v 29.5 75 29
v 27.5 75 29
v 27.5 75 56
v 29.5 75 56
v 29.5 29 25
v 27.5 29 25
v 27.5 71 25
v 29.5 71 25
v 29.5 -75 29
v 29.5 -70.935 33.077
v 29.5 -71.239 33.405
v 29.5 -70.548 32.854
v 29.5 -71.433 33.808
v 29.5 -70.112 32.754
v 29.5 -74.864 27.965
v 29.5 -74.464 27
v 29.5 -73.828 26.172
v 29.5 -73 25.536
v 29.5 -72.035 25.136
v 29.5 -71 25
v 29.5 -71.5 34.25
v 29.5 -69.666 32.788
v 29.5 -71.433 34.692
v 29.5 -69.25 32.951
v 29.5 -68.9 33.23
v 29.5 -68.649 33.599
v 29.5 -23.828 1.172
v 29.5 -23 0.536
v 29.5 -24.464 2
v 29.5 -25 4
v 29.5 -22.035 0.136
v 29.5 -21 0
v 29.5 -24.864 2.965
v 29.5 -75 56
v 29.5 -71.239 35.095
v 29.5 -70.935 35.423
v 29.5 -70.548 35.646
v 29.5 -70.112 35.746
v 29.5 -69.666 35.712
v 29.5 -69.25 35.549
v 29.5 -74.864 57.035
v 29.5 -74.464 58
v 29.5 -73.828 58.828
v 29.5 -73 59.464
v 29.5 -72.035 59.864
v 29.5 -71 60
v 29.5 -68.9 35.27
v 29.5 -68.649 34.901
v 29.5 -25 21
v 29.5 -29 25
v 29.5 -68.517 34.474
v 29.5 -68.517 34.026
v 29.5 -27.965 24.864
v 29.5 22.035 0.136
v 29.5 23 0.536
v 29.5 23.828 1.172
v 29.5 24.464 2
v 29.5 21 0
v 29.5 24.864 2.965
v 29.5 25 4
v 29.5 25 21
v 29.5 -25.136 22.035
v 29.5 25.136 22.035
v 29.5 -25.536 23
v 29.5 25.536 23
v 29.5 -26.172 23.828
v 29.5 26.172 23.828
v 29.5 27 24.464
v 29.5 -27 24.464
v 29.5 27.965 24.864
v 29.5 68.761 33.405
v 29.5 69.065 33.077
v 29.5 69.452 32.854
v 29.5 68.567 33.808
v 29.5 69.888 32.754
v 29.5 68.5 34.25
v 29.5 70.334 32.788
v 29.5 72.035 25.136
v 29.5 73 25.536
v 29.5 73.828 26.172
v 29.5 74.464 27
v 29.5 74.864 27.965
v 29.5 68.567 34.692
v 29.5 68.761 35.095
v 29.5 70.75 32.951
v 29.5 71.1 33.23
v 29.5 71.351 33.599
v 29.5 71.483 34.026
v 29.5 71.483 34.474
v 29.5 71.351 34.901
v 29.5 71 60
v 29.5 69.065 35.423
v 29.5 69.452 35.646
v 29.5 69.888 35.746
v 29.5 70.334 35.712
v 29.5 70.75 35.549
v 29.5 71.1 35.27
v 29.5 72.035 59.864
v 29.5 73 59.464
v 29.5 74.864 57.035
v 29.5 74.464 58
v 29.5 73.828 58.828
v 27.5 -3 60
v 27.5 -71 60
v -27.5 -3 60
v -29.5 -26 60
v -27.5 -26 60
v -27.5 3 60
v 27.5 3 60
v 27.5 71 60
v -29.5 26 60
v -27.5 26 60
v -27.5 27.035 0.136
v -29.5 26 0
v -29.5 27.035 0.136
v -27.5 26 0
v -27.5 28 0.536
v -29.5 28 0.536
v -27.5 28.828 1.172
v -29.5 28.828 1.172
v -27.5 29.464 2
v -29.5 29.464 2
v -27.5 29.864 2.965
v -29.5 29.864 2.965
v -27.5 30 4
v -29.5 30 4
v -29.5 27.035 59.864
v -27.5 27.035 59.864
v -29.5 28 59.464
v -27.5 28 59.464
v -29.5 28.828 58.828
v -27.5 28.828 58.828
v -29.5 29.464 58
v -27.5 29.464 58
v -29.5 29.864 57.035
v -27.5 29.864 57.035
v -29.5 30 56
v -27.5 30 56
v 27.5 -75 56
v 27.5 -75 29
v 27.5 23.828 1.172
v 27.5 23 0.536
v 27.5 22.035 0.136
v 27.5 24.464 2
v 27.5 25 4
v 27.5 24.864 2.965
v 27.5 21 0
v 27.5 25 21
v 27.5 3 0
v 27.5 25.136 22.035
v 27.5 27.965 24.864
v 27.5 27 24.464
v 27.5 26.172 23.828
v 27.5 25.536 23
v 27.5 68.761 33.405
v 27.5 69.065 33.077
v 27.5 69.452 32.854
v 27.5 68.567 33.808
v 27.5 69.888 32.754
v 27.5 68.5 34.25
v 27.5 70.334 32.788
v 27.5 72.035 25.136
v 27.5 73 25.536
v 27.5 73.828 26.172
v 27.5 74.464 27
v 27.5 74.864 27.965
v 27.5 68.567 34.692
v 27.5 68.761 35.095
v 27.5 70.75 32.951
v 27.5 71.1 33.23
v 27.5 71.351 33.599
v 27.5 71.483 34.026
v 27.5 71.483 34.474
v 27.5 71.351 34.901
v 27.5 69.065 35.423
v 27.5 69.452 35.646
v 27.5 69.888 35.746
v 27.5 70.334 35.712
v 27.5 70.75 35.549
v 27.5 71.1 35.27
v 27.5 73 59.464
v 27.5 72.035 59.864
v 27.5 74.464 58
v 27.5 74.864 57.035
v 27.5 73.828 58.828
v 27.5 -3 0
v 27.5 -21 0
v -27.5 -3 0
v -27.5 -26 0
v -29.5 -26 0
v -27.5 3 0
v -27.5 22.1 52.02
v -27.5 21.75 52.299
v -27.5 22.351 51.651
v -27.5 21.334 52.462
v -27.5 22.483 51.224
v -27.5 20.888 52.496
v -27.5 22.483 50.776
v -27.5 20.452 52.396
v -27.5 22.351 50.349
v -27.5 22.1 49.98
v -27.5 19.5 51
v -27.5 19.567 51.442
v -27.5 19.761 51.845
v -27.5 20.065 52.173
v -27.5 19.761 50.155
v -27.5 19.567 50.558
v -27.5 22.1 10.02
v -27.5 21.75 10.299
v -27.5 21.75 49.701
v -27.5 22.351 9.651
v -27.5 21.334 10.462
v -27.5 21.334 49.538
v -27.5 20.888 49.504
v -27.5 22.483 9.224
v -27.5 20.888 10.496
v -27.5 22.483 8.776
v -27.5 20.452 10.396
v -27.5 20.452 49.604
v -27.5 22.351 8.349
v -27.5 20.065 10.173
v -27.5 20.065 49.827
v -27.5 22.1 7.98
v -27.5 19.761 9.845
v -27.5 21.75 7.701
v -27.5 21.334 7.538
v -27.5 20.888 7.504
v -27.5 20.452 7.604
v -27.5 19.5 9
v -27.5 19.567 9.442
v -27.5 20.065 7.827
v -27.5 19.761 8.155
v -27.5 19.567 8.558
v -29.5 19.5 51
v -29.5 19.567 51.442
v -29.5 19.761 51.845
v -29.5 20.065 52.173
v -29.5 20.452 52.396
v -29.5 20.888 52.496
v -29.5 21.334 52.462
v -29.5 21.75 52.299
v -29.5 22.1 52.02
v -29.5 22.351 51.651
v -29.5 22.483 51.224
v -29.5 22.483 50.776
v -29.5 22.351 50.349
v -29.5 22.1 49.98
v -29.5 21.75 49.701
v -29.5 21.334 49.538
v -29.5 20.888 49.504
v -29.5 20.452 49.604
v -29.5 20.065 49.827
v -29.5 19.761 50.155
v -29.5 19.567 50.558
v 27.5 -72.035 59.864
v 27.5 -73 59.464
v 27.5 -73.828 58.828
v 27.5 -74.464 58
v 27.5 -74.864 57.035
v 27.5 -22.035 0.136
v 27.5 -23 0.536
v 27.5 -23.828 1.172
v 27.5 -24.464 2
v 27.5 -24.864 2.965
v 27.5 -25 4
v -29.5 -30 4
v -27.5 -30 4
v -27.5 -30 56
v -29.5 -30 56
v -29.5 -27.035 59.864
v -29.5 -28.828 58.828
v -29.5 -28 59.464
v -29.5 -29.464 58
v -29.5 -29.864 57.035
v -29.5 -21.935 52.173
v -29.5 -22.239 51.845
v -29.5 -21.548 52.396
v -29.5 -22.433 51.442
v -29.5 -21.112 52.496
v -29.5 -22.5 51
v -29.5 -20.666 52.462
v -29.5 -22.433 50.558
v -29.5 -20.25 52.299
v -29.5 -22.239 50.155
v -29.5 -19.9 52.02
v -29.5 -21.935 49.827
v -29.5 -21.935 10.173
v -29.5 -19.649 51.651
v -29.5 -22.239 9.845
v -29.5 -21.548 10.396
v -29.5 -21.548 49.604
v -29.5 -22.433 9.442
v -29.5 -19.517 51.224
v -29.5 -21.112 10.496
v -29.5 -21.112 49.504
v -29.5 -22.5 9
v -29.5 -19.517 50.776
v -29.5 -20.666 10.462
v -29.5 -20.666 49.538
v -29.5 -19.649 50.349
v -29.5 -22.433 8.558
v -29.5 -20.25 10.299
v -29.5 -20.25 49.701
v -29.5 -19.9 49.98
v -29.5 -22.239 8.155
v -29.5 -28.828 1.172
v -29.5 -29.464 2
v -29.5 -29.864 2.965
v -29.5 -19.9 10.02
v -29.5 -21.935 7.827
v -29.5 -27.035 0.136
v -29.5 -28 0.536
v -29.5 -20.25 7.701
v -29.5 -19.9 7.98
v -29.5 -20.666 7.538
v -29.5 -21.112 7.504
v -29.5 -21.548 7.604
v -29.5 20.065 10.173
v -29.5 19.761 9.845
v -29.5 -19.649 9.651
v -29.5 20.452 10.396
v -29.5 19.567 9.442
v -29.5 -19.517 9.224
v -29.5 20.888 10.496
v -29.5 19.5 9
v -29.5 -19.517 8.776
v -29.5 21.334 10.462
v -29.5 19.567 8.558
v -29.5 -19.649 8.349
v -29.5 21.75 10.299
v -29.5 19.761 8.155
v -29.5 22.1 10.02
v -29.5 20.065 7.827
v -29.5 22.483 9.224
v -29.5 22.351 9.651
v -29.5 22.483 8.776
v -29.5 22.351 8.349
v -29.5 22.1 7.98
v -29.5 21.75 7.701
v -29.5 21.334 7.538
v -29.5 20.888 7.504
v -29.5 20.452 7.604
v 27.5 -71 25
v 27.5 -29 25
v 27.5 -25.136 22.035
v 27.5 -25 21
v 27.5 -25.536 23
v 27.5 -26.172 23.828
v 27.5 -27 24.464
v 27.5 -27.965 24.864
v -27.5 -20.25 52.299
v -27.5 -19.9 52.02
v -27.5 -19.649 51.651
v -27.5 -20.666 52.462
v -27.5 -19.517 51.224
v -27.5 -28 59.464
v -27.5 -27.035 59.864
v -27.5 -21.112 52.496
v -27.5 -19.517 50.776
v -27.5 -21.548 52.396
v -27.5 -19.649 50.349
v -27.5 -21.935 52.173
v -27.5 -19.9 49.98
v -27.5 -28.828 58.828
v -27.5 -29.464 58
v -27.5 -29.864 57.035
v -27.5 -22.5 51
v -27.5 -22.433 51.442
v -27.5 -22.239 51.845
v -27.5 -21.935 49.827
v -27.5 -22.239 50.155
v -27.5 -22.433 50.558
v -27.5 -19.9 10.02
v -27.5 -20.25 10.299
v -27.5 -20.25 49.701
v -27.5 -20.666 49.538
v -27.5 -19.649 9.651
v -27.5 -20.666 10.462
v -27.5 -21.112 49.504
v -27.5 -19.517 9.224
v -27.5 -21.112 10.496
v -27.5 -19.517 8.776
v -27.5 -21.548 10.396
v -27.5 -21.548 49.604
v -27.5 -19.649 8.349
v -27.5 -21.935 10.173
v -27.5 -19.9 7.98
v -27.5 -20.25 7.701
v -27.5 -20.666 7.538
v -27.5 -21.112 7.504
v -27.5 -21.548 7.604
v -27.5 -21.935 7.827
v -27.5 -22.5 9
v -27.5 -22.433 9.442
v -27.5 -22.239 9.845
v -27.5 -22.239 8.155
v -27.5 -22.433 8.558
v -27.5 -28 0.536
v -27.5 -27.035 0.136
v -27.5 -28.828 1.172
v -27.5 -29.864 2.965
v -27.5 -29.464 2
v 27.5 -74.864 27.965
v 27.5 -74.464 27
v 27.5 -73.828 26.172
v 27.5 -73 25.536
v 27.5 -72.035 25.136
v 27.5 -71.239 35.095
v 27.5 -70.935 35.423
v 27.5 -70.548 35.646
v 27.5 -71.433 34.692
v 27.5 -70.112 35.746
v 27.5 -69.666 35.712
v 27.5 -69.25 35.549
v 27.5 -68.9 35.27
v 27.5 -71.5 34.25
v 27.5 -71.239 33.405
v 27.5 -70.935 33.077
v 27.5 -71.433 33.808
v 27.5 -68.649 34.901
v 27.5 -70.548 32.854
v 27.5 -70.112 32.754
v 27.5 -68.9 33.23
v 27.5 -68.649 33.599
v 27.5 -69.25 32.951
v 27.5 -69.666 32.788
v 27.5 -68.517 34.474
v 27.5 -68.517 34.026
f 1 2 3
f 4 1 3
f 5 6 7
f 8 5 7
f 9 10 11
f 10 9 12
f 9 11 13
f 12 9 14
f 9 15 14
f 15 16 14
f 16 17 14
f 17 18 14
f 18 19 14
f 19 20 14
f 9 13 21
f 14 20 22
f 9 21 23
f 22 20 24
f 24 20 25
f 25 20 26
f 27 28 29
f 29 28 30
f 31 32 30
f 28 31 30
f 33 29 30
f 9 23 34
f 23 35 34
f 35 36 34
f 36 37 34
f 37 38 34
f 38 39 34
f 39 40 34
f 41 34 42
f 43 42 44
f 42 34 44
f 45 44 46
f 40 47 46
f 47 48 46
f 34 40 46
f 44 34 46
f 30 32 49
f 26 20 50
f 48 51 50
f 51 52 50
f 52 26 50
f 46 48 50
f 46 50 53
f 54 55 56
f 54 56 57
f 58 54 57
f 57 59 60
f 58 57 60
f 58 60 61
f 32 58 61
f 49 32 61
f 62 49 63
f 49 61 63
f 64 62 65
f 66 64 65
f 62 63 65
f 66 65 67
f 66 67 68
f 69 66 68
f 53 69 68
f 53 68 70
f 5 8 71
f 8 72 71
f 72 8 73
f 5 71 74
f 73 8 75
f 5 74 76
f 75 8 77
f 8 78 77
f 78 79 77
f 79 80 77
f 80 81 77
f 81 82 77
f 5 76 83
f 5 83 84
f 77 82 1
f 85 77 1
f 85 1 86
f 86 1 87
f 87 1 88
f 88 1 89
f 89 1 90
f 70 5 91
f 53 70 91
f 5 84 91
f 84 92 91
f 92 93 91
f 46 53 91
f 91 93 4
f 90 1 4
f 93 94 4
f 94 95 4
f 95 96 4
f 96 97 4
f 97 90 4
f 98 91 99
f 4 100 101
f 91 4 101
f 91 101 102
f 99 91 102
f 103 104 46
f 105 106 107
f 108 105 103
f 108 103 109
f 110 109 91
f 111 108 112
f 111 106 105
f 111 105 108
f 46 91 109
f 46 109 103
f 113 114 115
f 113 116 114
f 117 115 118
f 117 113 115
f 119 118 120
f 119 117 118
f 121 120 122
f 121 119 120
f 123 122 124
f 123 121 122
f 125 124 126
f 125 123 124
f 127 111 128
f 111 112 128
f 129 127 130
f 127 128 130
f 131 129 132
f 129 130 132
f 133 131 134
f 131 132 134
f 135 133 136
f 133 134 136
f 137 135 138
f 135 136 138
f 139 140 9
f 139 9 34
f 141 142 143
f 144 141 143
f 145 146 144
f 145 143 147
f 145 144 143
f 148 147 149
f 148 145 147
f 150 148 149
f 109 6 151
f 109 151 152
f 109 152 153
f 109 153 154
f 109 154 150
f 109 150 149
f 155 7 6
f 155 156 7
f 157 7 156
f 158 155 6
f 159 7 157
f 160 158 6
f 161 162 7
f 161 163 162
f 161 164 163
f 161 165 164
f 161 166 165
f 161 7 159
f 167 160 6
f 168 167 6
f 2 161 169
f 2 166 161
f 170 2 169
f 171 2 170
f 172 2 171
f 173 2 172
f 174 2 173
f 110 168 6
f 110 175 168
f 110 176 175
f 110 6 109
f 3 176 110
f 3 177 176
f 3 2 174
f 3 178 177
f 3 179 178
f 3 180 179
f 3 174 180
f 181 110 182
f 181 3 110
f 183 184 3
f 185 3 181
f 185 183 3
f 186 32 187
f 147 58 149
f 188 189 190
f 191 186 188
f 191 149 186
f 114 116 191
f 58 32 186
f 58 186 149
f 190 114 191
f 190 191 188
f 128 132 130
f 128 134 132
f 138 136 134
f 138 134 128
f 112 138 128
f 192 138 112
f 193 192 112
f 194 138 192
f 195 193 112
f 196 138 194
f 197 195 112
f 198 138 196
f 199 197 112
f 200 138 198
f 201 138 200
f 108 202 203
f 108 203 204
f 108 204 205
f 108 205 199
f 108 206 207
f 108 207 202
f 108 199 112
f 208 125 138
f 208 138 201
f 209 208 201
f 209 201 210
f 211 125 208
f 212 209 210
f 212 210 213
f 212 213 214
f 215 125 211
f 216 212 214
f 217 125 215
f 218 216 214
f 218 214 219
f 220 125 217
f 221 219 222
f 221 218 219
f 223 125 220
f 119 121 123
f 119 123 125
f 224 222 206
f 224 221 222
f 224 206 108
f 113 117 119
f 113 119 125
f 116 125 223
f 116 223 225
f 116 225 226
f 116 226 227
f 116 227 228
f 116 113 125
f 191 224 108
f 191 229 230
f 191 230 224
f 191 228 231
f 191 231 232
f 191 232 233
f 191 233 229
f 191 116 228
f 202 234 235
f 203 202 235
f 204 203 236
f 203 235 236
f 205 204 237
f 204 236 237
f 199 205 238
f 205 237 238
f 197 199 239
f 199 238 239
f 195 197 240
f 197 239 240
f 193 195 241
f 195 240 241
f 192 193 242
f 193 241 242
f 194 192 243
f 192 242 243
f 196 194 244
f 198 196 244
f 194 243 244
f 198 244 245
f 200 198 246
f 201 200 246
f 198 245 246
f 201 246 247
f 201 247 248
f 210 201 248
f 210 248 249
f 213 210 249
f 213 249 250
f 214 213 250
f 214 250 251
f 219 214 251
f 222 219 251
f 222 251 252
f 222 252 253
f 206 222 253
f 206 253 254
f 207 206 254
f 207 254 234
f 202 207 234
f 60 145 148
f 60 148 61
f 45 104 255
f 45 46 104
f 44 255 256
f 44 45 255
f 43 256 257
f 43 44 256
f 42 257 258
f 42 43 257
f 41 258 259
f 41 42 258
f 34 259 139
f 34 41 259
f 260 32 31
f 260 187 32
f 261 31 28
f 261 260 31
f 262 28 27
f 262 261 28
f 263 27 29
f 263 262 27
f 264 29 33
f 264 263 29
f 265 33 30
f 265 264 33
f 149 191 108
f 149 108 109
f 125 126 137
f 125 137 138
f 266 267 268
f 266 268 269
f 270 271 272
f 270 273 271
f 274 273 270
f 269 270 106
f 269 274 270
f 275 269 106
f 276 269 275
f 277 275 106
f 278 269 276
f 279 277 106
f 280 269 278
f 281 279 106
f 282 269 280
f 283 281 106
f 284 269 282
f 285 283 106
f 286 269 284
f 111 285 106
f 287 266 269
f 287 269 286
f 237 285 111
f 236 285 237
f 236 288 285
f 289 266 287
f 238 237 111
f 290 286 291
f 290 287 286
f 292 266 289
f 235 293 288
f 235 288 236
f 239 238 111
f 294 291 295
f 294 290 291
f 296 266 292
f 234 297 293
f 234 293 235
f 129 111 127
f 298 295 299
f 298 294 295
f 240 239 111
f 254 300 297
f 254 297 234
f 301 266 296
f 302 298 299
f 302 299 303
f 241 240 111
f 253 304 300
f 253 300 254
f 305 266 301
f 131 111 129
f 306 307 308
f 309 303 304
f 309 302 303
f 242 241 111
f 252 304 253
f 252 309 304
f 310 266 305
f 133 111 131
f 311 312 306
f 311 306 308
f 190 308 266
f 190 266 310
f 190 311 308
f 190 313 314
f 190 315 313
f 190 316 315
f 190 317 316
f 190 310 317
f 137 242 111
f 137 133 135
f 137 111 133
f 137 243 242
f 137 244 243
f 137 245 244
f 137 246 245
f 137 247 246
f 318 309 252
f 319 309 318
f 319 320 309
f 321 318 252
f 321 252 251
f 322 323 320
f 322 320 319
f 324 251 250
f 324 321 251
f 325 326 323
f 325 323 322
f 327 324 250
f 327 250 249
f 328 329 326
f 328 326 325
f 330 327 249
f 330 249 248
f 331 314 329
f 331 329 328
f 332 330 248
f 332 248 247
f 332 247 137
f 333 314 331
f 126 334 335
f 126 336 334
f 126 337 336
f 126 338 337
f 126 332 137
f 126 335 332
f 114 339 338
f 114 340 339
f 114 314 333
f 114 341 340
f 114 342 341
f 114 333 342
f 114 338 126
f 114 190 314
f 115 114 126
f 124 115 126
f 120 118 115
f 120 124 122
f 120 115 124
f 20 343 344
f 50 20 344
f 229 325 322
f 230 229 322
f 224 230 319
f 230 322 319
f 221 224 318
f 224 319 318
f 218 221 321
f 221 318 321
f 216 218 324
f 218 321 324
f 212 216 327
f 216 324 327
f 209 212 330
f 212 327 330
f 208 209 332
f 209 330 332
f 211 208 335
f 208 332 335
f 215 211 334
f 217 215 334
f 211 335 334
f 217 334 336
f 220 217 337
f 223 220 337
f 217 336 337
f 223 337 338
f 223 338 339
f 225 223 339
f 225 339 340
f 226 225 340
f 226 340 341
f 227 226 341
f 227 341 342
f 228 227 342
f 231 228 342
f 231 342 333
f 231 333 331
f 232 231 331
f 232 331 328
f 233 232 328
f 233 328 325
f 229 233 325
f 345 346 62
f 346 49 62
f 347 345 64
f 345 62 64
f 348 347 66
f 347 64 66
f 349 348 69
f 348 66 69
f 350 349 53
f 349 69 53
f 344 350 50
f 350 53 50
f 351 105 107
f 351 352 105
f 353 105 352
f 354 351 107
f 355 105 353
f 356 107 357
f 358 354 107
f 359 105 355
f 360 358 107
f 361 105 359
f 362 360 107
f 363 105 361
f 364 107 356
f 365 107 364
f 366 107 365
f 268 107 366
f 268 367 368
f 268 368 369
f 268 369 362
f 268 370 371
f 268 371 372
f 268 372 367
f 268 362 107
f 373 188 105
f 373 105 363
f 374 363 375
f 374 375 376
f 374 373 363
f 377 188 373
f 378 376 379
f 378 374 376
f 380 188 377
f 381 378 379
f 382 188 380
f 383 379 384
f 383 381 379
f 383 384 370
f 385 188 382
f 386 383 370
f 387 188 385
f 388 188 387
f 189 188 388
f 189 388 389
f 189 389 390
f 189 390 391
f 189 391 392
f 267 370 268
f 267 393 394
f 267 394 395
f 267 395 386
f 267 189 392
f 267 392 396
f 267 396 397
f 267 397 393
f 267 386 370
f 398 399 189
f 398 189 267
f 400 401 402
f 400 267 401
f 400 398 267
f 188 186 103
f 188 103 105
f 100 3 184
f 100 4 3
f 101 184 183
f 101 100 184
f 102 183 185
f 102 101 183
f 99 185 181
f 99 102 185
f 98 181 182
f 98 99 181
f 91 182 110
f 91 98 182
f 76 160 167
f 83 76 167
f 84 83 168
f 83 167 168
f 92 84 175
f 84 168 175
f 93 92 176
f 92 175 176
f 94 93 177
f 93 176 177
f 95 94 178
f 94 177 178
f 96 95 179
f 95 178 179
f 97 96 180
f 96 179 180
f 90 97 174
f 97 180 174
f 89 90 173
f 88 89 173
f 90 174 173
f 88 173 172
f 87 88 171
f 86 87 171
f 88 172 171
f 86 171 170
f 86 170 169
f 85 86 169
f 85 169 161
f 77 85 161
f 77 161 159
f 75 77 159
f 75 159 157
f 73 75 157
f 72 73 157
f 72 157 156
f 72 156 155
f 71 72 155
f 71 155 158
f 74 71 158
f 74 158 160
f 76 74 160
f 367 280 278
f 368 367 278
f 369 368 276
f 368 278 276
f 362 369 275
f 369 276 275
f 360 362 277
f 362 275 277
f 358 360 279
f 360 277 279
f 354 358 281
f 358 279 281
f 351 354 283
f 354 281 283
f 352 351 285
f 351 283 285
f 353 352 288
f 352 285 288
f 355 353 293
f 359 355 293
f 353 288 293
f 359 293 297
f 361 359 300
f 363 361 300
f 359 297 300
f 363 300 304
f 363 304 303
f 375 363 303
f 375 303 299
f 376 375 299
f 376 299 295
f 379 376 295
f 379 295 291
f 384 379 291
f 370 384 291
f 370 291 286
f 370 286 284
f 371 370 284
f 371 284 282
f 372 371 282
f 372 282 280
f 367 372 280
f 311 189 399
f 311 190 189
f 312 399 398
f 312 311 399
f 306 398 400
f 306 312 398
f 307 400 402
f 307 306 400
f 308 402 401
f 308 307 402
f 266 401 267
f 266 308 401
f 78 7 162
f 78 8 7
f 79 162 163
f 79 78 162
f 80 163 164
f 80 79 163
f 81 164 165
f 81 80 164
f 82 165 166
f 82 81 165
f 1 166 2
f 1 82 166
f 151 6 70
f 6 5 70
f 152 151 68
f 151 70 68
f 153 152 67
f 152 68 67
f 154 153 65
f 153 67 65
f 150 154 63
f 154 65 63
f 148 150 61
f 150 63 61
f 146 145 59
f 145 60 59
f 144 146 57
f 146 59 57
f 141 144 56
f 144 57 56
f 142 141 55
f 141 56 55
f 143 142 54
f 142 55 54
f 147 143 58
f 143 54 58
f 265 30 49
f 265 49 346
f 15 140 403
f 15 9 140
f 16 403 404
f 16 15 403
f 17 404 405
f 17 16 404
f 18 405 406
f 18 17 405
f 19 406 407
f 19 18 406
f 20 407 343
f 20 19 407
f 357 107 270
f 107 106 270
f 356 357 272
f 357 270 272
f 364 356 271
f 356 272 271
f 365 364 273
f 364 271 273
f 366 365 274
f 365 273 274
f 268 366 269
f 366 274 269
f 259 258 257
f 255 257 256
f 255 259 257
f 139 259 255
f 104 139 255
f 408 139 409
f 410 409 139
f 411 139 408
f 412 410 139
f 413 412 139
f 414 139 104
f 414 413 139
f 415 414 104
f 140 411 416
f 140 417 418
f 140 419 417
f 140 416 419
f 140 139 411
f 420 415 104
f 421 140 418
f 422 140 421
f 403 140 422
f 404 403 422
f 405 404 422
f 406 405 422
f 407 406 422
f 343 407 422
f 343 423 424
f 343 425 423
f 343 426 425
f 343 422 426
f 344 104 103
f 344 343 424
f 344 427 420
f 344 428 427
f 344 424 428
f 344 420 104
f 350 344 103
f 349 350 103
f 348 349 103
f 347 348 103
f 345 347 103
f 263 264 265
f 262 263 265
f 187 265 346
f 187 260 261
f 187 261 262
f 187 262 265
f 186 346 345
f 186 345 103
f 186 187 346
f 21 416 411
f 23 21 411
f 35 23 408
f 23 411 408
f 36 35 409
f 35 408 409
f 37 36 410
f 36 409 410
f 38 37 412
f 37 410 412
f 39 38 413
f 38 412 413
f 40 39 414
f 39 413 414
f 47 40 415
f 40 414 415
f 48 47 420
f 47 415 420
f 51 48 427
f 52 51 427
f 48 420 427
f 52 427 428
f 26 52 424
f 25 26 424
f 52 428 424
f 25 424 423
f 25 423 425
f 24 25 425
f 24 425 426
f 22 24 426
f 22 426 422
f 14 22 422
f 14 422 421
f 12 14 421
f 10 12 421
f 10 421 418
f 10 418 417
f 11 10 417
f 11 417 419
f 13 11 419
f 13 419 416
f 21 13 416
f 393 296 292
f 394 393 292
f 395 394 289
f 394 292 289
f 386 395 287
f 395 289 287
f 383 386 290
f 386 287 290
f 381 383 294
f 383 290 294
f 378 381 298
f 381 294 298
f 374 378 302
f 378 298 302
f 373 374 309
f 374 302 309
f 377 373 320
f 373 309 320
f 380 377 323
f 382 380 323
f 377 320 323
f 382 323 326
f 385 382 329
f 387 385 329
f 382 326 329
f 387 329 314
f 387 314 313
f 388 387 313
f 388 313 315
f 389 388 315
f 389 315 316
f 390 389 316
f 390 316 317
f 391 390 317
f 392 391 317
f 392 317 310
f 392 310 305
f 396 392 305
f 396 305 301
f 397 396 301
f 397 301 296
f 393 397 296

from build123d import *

# Parameters (mm, degrees)
EXTRUDE_2_DEPTH     = 60
SKETCH_3_R          = 1.5
CUT_EXTRUDE_1_DEPTH = 40
SKETCH_7_W          = 35
SKETCH_7_H          = 50
EXTRUDE_4_DEPTH     = 2
SKETCH_8_R          = 1.5
CUT_EXTRUDE_3_DEPTH = 12
FILLET_1_R          = 4


with BuildPart() as part:
    # 草图1 → 凸台-拉伸2 (new body)
    with BuildSketch(Plane.XY):
        Polygon((-29.5, 30), (-27.5, 30), (-27.5, 3), (27.5, 3), (27.5, 25), (29.5, 25), (29.5, -25), (27.5, -25), (27.5, -3), (-27.5, -3), (-27.5, -30), (-29.5, -30), align=None)
    extrude(amount=EXTRUDE_2_DEPTH)

    # 草图3 → 切除-拉伸1 (cut)
    with BuildSketch(Plane.ZY.offset(29.5)):
        with Locations(Location((51, 21, 0), (0, 0, 270))):
            Circle(SKETCH_3_R)
        with Locations(Location((51, -21, 0), (0, 0, 270))):
            Circle(SKETCH_3_R)
        with Locations(Location((9, 21, 0), (0, 0, 270))):
            Circle(SKETCH_3_R)
        with Locations(Location((9, -21, 0), (0, 0, 270))):
            Circle(SKETCH_3_R)
    extrude(amount=-CUT_EXTRUDE_1_DEPTH, mode=Mode.SUBTRACT)

    # 草图7 → 凸台-拉伸4 (add)
    with BuildSketch(Plane.ZY.offset(-27.5)):
        with Locations((42.5, 50)):
            Rectangle(SKETCH_7_W, SKETCH_7_H)
        with Locations((42.5, -50)):
            Rectangle(SKETCH_7_W, SKETCH_7_H)
    extrude(amount=-EXTRUDE_4_DEPTH)

    # 草图8 → 切除-拉伸3 (cut)
    with BuildSketch(Plane.ZY.offset(-27.5)):
        with Locations(Location((34.25, 70, 0), (0, 0, 270))):
            Circle(SKETCH_8_R)
        with Locations(Location((34.25, -70, 0), (0, 0, 270))):
            Circle(SKETCH_8_R)
    extrude(amount=-CUT_EXTRUDE_3_DEPTH, mode=Mode.SUBTRACT)

    # 圆角1
    fillet_1_edges = [part.edges().sort_by_distance(p)[0] for p in [
        (-28.5, 30, 0),
        (28.5, 25, 0),
        (28.5, -25, 0),
        (-28.5, -30, 0),
        (-28.5, 30, 60),
        (28.5, 25, 25),
        (28.5, 75, 25),
        (28.5, 75, 60),
        (28.5, -25, 25),
        (28.5, -75, 60),
        (28.5, -75, 25),
        (-28.5, -30, 60),
    ]]
    fillet(fillet_1_edges, radius=FILLET_1_R)


solid = part.part
